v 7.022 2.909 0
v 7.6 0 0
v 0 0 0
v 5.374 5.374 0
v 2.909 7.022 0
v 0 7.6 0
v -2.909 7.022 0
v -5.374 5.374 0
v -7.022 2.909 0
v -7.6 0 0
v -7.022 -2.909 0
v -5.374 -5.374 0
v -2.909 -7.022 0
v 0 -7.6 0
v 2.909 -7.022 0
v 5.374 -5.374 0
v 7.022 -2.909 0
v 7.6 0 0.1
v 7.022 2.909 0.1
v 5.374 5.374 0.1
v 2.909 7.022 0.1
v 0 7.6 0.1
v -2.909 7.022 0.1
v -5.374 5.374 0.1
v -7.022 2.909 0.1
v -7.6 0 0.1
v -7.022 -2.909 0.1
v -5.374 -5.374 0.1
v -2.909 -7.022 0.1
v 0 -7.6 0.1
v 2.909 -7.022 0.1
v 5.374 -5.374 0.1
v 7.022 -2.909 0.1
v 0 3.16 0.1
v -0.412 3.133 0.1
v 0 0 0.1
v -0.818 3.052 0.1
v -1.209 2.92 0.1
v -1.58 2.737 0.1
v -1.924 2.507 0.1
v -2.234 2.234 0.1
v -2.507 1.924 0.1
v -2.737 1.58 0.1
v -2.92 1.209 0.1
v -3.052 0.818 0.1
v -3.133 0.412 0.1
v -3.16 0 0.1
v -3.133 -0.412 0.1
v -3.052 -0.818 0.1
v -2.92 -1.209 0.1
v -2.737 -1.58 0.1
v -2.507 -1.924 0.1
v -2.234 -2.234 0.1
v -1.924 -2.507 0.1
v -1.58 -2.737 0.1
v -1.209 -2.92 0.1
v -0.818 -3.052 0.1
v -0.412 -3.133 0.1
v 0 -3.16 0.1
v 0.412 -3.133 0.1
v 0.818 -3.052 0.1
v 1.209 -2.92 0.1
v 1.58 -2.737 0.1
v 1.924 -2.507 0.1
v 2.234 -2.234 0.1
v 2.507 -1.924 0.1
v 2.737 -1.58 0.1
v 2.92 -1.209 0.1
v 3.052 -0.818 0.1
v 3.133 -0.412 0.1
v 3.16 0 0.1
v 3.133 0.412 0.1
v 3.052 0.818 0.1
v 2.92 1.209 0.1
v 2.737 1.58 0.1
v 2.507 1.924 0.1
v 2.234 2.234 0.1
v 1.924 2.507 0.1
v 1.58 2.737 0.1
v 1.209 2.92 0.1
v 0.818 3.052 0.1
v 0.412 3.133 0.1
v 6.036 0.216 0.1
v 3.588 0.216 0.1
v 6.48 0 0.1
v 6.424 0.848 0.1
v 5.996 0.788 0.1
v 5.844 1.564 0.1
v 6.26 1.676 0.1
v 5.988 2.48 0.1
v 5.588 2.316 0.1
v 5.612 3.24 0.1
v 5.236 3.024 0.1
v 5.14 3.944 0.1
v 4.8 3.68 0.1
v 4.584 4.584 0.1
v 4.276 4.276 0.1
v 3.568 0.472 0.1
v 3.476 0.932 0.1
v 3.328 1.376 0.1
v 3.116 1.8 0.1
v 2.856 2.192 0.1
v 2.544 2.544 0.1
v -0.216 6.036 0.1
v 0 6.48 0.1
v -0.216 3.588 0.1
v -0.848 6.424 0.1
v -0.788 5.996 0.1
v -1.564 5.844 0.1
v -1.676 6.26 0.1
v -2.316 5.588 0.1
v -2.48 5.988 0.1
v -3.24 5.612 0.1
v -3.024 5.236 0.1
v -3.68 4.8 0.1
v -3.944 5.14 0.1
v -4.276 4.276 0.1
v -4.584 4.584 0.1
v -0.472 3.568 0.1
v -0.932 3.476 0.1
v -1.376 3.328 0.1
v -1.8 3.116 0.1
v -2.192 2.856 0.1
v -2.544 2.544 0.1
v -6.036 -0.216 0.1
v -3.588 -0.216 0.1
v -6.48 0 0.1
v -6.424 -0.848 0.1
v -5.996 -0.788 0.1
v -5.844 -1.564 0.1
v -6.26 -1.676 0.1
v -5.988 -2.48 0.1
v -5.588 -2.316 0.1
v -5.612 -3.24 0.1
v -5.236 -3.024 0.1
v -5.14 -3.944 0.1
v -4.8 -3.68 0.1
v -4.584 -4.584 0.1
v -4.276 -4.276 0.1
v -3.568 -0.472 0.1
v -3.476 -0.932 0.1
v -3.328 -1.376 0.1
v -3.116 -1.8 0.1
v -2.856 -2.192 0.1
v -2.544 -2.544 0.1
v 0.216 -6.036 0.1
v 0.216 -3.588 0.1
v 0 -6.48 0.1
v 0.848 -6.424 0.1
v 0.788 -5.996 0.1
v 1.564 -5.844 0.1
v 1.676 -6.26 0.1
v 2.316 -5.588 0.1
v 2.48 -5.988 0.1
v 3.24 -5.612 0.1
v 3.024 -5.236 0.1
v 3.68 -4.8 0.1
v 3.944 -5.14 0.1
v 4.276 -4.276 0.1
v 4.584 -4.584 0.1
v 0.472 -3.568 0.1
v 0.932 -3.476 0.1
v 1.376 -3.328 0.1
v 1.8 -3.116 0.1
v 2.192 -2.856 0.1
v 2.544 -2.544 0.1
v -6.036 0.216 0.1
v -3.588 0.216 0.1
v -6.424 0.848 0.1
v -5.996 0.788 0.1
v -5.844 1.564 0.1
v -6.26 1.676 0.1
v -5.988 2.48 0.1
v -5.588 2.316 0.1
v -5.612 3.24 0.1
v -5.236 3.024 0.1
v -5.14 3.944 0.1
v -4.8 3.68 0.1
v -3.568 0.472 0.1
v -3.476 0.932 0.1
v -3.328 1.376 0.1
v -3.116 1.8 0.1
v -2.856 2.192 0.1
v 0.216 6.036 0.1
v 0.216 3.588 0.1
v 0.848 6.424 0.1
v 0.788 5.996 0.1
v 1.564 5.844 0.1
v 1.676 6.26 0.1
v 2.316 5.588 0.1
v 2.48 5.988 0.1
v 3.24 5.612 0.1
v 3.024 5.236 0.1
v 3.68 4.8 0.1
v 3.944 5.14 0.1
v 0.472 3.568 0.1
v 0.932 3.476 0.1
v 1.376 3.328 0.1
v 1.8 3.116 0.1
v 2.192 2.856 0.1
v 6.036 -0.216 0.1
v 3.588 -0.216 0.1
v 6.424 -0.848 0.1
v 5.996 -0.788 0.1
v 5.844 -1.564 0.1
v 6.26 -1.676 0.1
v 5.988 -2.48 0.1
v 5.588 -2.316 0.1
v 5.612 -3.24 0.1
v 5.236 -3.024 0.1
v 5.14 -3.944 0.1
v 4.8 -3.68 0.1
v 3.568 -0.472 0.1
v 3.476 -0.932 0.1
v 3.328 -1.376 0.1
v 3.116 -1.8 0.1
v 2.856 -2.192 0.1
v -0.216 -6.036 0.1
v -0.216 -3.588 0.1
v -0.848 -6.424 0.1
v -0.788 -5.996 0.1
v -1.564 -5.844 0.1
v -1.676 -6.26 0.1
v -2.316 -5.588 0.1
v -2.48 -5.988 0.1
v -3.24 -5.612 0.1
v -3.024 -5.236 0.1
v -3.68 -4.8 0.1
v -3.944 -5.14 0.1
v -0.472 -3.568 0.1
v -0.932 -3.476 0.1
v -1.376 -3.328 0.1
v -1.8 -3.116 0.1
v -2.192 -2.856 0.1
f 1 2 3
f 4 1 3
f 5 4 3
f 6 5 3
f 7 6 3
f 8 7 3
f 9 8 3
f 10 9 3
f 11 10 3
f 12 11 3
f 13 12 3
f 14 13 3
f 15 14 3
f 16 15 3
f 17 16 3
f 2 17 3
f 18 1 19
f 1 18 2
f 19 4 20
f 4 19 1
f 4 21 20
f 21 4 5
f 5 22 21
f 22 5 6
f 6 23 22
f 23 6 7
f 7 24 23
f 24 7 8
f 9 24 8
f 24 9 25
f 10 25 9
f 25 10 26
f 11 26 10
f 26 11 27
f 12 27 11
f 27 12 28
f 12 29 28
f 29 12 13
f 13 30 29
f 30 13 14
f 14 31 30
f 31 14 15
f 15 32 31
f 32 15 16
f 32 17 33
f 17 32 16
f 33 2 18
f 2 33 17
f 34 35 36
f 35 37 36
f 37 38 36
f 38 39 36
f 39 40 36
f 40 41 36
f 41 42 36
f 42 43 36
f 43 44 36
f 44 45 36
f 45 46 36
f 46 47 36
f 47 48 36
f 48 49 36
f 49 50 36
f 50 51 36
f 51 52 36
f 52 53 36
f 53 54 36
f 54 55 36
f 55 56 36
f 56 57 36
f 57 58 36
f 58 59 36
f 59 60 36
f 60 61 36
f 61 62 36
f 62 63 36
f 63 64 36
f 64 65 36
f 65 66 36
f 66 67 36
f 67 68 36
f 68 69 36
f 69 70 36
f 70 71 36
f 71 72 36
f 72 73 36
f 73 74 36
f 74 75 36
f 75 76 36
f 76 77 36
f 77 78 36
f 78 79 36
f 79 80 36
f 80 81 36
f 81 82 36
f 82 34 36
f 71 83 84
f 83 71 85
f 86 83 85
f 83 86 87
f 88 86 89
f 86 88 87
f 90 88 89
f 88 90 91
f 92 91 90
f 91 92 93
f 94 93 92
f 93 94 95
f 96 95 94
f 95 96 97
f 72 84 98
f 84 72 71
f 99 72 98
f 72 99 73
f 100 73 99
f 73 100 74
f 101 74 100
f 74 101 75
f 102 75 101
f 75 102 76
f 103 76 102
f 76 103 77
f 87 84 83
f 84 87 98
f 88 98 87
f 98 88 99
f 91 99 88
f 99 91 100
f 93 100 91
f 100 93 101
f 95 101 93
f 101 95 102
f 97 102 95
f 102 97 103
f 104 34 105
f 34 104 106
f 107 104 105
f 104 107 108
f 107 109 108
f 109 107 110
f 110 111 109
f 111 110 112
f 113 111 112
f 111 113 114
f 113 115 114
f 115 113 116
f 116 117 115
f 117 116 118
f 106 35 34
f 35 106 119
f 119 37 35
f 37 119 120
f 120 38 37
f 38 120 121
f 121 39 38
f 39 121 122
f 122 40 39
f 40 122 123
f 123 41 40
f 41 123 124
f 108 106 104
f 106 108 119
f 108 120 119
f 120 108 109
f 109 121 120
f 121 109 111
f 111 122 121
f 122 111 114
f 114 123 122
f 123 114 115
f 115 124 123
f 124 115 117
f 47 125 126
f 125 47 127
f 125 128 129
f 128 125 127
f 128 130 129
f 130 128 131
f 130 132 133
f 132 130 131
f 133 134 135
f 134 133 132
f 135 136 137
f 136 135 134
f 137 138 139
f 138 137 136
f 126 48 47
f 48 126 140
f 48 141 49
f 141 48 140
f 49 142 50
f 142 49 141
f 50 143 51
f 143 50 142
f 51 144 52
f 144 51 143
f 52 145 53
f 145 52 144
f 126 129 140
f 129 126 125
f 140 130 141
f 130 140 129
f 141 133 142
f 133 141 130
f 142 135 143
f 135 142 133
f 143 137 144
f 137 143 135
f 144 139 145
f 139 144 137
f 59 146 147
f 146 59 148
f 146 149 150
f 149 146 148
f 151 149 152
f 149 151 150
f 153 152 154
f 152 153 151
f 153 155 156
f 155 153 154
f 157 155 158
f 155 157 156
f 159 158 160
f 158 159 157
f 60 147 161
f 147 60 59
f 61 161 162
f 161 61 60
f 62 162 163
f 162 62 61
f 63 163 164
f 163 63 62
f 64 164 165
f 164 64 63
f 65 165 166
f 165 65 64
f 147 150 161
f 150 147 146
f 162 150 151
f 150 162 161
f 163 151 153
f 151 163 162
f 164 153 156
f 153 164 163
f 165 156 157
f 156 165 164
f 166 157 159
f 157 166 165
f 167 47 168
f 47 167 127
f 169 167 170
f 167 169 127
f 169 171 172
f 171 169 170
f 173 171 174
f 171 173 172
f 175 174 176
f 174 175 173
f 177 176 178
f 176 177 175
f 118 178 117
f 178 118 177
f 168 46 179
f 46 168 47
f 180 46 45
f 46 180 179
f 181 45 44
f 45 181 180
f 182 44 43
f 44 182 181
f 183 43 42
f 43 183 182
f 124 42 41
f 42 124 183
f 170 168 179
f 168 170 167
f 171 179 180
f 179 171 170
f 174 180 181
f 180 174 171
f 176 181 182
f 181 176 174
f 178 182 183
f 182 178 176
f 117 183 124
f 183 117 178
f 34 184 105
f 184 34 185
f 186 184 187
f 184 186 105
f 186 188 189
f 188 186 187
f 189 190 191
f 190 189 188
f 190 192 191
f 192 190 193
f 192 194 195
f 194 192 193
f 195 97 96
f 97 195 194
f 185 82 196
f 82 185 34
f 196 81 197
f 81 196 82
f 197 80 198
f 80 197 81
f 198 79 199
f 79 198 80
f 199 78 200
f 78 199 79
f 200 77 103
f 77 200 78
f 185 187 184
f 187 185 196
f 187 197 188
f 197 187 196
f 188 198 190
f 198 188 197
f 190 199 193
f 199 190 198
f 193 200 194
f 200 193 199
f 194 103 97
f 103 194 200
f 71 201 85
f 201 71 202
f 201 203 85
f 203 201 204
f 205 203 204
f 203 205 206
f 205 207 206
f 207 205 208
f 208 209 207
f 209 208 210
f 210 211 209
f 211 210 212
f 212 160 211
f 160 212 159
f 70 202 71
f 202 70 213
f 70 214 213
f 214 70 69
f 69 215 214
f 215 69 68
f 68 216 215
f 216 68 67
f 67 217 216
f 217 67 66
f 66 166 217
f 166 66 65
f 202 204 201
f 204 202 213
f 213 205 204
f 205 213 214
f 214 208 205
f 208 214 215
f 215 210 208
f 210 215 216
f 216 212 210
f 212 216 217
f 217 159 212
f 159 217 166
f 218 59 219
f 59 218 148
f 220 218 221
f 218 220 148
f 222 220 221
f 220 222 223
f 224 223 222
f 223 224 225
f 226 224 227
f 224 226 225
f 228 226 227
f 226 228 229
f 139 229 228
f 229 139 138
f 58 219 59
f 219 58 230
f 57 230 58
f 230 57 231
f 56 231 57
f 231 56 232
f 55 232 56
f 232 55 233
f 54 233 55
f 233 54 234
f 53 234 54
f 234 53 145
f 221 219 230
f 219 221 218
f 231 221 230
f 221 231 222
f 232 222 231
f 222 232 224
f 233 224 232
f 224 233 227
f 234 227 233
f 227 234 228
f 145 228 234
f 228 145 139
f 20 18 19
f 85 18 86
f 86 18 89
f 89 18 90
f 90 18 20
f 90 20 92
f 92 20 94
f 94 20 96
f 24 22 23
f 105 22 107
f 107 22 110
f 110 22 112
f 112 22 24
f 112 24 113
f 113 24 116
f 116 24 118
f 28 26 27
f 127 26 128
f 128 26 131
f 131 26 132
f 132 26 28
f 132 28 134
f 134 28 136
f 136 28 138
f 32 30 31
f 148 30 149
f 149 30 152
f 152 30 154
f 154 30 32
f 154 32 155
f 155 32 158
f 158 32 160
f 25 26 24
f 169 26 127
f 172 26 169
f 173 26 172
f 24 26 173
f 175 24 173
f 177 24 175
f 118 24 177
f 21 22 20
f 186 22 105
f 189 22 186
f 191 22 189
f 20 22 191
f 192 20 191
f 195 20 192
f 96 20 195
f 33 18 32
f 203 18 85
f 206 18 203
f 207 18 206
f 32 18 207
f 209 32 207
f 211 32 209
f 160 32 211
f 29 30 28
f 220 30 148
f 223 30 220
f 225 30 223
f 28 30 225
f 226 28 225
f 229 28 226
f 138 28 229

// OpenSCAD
// file: ../p/1-8chrd.scad
use <../lib.scad>
function ldraw_lib__1_8chrd() = [
// 0 Chord 0.125
// 0 Name: 1-8chrd.dat
// 0 Author: Orion Pobursky [OrionP]
// 0 !LDRAW_ORG Primitive UPDATE 2023-05
// 0 !LICENSE Licensed under CC BY 4.0 : see CAreadme.txt
// 
// 0 BFC CERTIFY CCW
  [0,"BFC","CERTIFY"],
  [0,"BFC","CCW"],
// 
// 0 !HISTORY 2004-04-22 [PTadmin] Official Update 2004-02
// 0 !HISTORY 2007-06-22 [PTadmin] Header formatted for Contributor Agreement
// 0 !HISTORY 2008-07-01 [PTadmin] Official Update 2008-01
// 0 !HISTORY 2023-10-27 [OrionP] Rebuilt with PrimGen2, original author westrate
// 0 !HISTORY 2023-10-31 [OrionP] Official Update 2023-05
// 
// 3 16 1 0 0 0.9239 0 0.3827 0.7071 0 0.7071
  [3,16,1,0,0,0.9239,0,0.3827,0.7071,0,0.7071],
];
module ldraw_lib__1_8chrd(step=0, col=false, unit=2/5, alt=false, line=0.2, solid=!$preview)
    makepoly(ldraw_lib__1_8chrd(), step=step, col=col, unit=unit, alt=alt, line=line, solid=solid);
ldraw_lib__1_8chrd(line=0.2);
// file: ../p/4-4disc.scad
use <../lib.scad>
function ldraw_lib__4_4disc() = [
// 0 Disc 1.0
// 0 Name: 4-4disc.dat
// 0 Author: James Jessiman
// 0 !LDRAW_ORG Primitive UPDATE 2002-02
// 0 !LICENSE Licensed under CC BY 4.0 : see CAreadme.txt
// 
// 0 BFC CERTIFY CCW
  [0,"BFC","CERTIFY"],
  [0,"BFC","CCW"],
// 
// 0 !HISTORY 1998-12-15 [PTadmin] Official Update 1998-10
// 0 !HISTORY 2002-03-23 [sbliss] Added BFC statement
// 0 !HISTORY 2002-04-25 [PTadmin] Official Update 2002-02
// 0 !HISTORY 2007-06-24 [PTadmin] Header formatted for Contributor Agreement
// 0 !HISTORY 2008-07-01 [PTadmin] Official Update 2008-01
// 
// 
// 3 16 0 0 0 1 0 0 0.9239 0 0.3827
  [3,16,0,0,0,1,0,0,0.9239,0,0.3827],
// 3 16 0 0 0 0.9239 0 0.3827 0.7071 0 0.7071
  [3,16,0,0,0,0.9239,0,0.3827,0.7071,0,0.7071],
// 3 16 0 0 0 0.7071 0 0.7071 0.3827 0 0.9239
  [3,16,0,0,0,0.7071,0,0.7071,0.3827,0,0.9239],
// 3 16 0 0 0 0.3827 0 0.9239 0 0 1
  [3,16,0,0,0,0.3827,0,0.9239,0,0,1],
// 3 16 0 0 0 0 0 1 -0.3827 0 0.9239
  [3,16,0,0,0,0,0,1,-0.3827,0,0.9239],
// 3 16 0 0 0 -0.3827 0 0.9239 -0.7071 0 0.7071
  [3,16,0,0,0,-0.3827,0,0.9239,-0.7071,0,0.7071],
// 3 16 0 0 0 -0.7071 0 0.7071 -0.9239 0 0.3827
  [3,16,0,0,0,-0.7071,0,0.7071,-0.9239,0,0.3827],
// 3 16 0 0 0 -0.9239 0 0.3827 -1 0 -0
  [3,16,0,0,0,-0.9239,0,0.3827,-1,0,-0],
// 3 16 0 0 0 -1 0 -0 -0.9239 0 -0.3827
  [3,16,0,0,0,-1,0,-0,-0.9239,0,-0.3827],
// 3 16 0 0 0 -0.9239 0 -0.3827 -0.7071 0 -0.7071
  [3,16,0,0,0,-0.9239,0,-0.3827,-0.7071,0,-0.7071],
// 3 16 0 0 0 -0.7071 0 -0.7071 -0.3827 0 -0.9239
  [3,16,0,0,0,-0.7071,0,-0.7071,-0.3827,0,-0.9239],
// 3 16 0 0 0 -0.3827 0 -0.9239 0 0 -1
  [3,16,0,0,0,-0.3827,0,-0.9239,0,0,-1],
// 3 16 0 0 0 0 0 -1 0.3827 0 -0.9239
  [3,16,0,0,0,0,0,-1,0.3827,0,-0.9239],
// 3 16 0 0 0 0.3827 0 -0.9239 0.7071 0 -0.7071
  [3,16,0,0,0,0.3827,0,-0.9239,0.7071,0,-0.7071],
// 3 16 0 0 0 0.7071 0 -0.7071 0.9239 0 -0.3827
  [3,16,0,0,0,0.7071,0,-0.7071,0.9239,0,-0.3827],
// 3 16 0 0 0 0.9239 0 -0.3827 1 0 0
  [3,16,0,0,0,0.9239,0,-0.3827,1,0,0],
// 0
];
module ldraw_lib__4_4disc(step=0, col=false, unit=2/5, alt=false, line=0.2, solid=!$preview)
    makepoly(ldraw_lib__4_4disc(), step=step, col=col, unit=unit, alt=alt, line=line, solid=solid);
ldraw_lib__4_4disc(line=0.2);
// file: ../p/4-4cyli.scad
use <../lib.scad>
function ldraw_lib__4_4cyli() = [
// 0 Cylinder 1.0
// 0 Name: 4-4cyli.dat
// 0 Author: James Jessiman
// 0 !LDRAW_ORG Primitive UPDATE 2005-01
// 0 !LICENSE Licensed under CC BY 4.0 : see CAreadme.txt
// 
// 0 BFC CERTIFY CCW
  [0,"BFC","CERTIFY"],
  [0,"BFC","CCW"],
// 
// 0 !HISTORY 1998-12-15 [PTadmin] Official Update 1998-10
// 0 !HISTORY 2002-03-23 [sbliss] Added BFC statement; merged headers from files in distributions LDraw 0.27 and Complete.
// 0 !HISTORY 2002-04-25 [PTadmin] Official Update 2002-02
// 0 !HISTORY 2004-12-14 [guyvivan] BFC CCW
// 0 !HISTORY 2005-12-28 [PTadmin] Official Update 2005-01
// 0 !HISTORY 2007-06-24 [PTadmin] Header formatted for Contributor Agreement
// 0 !HISTORY 2008-07-01 [PTadmin] Official Update 2008-01
// 
// 
// 4 16 1 1 0 0.9239 1 0.3827 0.9239 0 0.3827 1 0 0
  [4,16,1,1,0,0.9239,1,0.3827,0.9239,0,0.3827,1,0,0],
// 5 24 1 0 0 1 1 0 0.9239 0 0.3827 0.9239 0 -0.3827
  [5,24,1,0,0,1,1,0,0.9239,0,0.3827,0.9239,0,-0.3827],
// 4 16 0.9239 1 0.3827 0.7071 1 0.7071 0.7071 0 0.7071 0.9239 0 0.3827
  [4,16,0.9239,1,0.3827,0.7071,1,0.7071,0.7071,0,0.7071,0.9239,0,0.3827],
// 5 24 0.9239 0 0.3827 0.9239 1 0.3827 0.7071 0 0.7071 1 0 0
  [5,24,0.9239,0,0.3827,0.9239,1,0.3827,0.7071,0,0.7071,1,0,0],
// 4 16 0.7071 1 0.7071 0.3827 1 0.9239 0.3827 0 0.9239 0.7071 0 0.7071
  [4,16,0.7071,1,0.7071,0.3827,1,0.9239,0.3827,0,0.9239,0.7071,0,0.7071],
// 5 24 0.7071 0 0.7071 0.7071 1 0.7071 0.3827 0 0.9239 0.9239 0 0.3827
  [5,24,0.7071,0,0.7071,0.7071,1,0.7071,0.3827,0,0.9239,0.9239,0,0.3827],
// 4 16 0.3827 1 0.9239 0 1 1 0 0 1 0.3827 0 0.9239
  [4,16,0.3827,1,0.9239,0,1,1,0,0,1,0.3827,0,0.9239],
// 5 24 0.3827 0 0.9239 0.3827 1 0.9239 0 0 1 0.7071 0 0.7071
  [5,24,0.3827,0,0.9239,0.3827,1,0.9239,0,0,1,0.7071,0,0.7071],
// 4 16 0 1 1 -0.3827 1 0.9239 -0.3827 0 0.9239 0 0 1
  [4,16,0,1,1,-0.3827,1,0.9239,-0.3827,0,0.9239,0,0,1],
// 5 24 0 0 1 0 1 1 -0.3827 0 0.9239 0.3827 0 0.9239
  [5,24,0,0,1,0,1,1,-0.3827,0,0.9239,0.3827,0,0.9239],
// 4 16 -0.3827 1 0.9239 -0.7071 1 0.7071 -0.7071 0 0.7071 -0.3827 0 0.9239
  [4,16,-0.3827,1,0.9239,-0.7071,1,0.7071,-0.7071,0,0.7071,-0.3827,0,0.9239],
// 5 24 -0.3827 0 0.9239 -0.3827 1 0.9239 -0.7071 0 0.7071 0 0 1
  [5,24,-0.3827,0,0.9239,-0.3827,1,0.9239,-0.7071,0,0.7071,0,0,1],
// 4 16 -0.7071 1 0.7071 -0.9239 1 0.3827 -0.9239 0 0.3827 -0.7071 0 0.7071
  [4,16,-0.7071,1,0.7071,-0.9239,1,0.3827,-0.9239,0,0.3827,-0.7071,0,0.7071],
// 5 24 -0.7071 0 0.7071 -0.7071 1 0.7071 -0.9239 0 0.3827 -0.3827 0 0.9239
  [5,24,-0.7071,0,0.7071,-0.7071,1,0.7071,-0.9239,0,0.3827,-0.3827,0,0.9239],
// 4 16 -0.9239 1 0.3827 -1 1 0 -1 0 0 -0.9239 0 0.3827
  [4,16,-0.9239,1,0.3827,-1,1,0,-1,0,0,-0.9239,0,0.3827],
// 5 24 -0.9239 0 0.3827 -0.9239 1 0.3827 -1 0 0 -0.7071 0 0.7071
  [5,24,-0.9239,0,0.3827,-0.9239,1,0.3827,-1,0,0,-0.7071,0,0.7071],
// 4 16 -1 1 0 -0.9239 1 -0.3827 -0.9239 0 -0.3827 -1 0 0
  [4,16,-1,1,0,-0.9239,1,-0.3827,-0.9239,0,-0.3827,-1,0,0],
// 5 24 -1 0 0 -1 1 0 -0.9239 0 -0.3827 -0.9239 0 0.3827
  [5,24,-1,0,0,-1,1,0,-0.9239,0,-0.3827,-0.9239,0,0.3827],
// 4 16 -0.9239 1 -0.3827 -0.7071 1 -0.7071 -0.7071 0 -0.7071 -0.9239 0 -0.3827
  [4,16,-0.9239,1,-0.3827,-0.7071,1,-0.7071,-0.7071,0,-0.7071,-0.9239,0,-0.3827],
// 5 24 -0.9239 0 -0.3827 -0.9239 1 -0.3827 -0.7071 0 -0.7071 -1 0 0
  [5,24,-0.9239,0,-0.3827,-0.9239,1,-0.3827,-0.7071,0,-0.7071,-1,0,0],
// 4 16 -0.7071 1 -0.7071 -0.3827 1 -0.9239 -0.3827 0 -0.9239 -0.7071 0 -0.7071
  [4,16,-0.7071,1,-0.7071,-0.3827,1,-0.9239,-0.3827,0,-0.9239,-0.7071,0,-0.7071],
// 5 24 -0.7071 0 -0.7071 -0.7071 1 -0.7071 -0.3827 0 -0.9239 -0.9239 0 -0.3827
  [5,24,-0.7071,0,-0.7071,-0.7071,1,-0.7071,-0.3827,0,-0.9239,-0.9239,0,-0.3827],
// 4 16 -0.3827 1 -0.9239 0 1 -1 0 0 -1 -0.3827 0 -0.9239
  [4,16,-0.3827,1,-0.9239,0,1,-1,0,0,-1,-0.3827,0,-0.9239],
// 5 24 -0.3827 0 -0.9239 -0.3827 1 -0.9239 0 0 -1 -0.7071 0 -0.7071
  [5,24,-0.3827,0,-0.9239,-0.3827,1,-0.9239,0,0,-1,-0.7071,0,-0.7071],
// 4 16 0 1 -1 0.3827 1 -0.9239 0.3827 0 -0.9239 0 0 -1
  [4,16,0,1,-1,0.3827,1,-0.9239,0.3827,0,-0.9239,0,0,-1],
// 5 24 0 0 -1 0 1 -1 0.3827 0 -0.9239 -0.3827 0 -0.9239
  [5,24,0,0,-1,0,1,-1,0.3827,0,-0.9239,-0.3827,0,-0.9239],
// 4 16 0.3827 1 -0.9239 0.7071 1 -0.7071 0.7071 0 -0.7071 0.3827 0 -0.9239
  [4,16,0.3827,1,-0.9239,0.7071,1,-0.7071,0.7071,0,-0.7071,0.3827,0,-0.9239],
// 5 24 0.3827 0 -0.9239 0.3827 1 -0.9239 0.7071 0 -0.7071 0 0 -1
  [5,24,0.3827,0,-0.9239,0.3827,1,-0.9239,0.7071,0,-0.7071,0,0,-1],
// 4 16 0.7071 1 -0.7071 0.9239 1 -0.3827 0.9239 0 -0.3827 0.7071 0 -0.7071
  [4,16,0.7071,1,-0.7071,0.9239,1,-0.3827,0.9239,0,-0.3827,0.7071,0,-0.7071],
// 5 24 0.7071 0 -0.7071 0.7071 1 -0.7071 0.9239 0 -0.3827 0.3827 0 -0.9239
  [5,24,0.7071,0,-0.7071,0.7071,1,-0.7071,0.9239,0,-0.3827,0.3827,0,-0.9239],
// 4 16 0.9239 1 -0.3827 1 1 0 1 0 0 0.9239 0 -0.3827
  [4,16,0.9239,1,-0.3827,1,1,0,1,0,0,0.9239,0,-0.3827],
// 5 24 0.9239 0 -0.3827 0.9239 1 -0.3827 1 0 0 0.7071 0 -0.7071
  [5,24,0.9239,0,-0.3827,0.9239,1,-0.3827,1,0,0,0.7071,0,-0.7071],
// 0
];
module ldraw_lib__4_4cyli(step=0, col=false, unit=2/5, alt=false, line=0.2, solid=!$preview)
    makepoly(ldraw_lib__4_4cyli(), step=step, col=col, unit=unit, alt=alt, line=line, solid=solid);
ldraw_lib__4_4cyli(line=0.2);
// file: s/820671as02.scad
use <../../lib.scad>
use <../../p/1-8chrd.scad>
function ldraw_lib__s__820671as02() = [
// 0 ~Sticker  1.9 x  1.9 Round with Lifepreserver - Outer Ring Eighth
// 0 Name: s\820671as02.dat
// 0 Author: Takeshi Takahashi [RainbowDolphin]
// 0 !LDRAW_ORG Subpart UPDATE 2024-09
// 0 !LICENSE Licensed under CC BY 4.0 : see CAreadme.txt
// 
// 0 BFC CERTIFY CCW
  [0,"BFC","CERTIFY"],
  [0,"BFC","CCW"],
// 
// 0 !HISTORY 2024-10-27 [OrionP] Official Update 2024-09
// 
// 1 16 0 0 0 19 0 0 0 1 0 0 0 19 1-8chrd.dat
  [1,16,0,0,0,19,0,0,0,1,0,0,0,19, ldraw_lib__1_8chrd()],
// 3 16 16.2 0 0 19 0 0 16.06 0 2.12
  [3,16,16.2,0,0,19,0,0,16.06,0,2.12],
// 3 16 16.06 0 2.12 19 0 0 15.65 0 4.19
  [3,16,16.06,0,2.12,19,0,0,15.65,0,4.19],
// 3 16 15.65 0 4.19 19 0 0 14.97 0 6.2
  [3,16,15.65,0,4.19,19,0,0,14.97,0,6.2],
// 3 16 14.97 0 6.2 19 0 0 13.4349 0 13.4349
  [3,16,14.97,0,6.2,19,0,0,13.4349,0,13.4349],
// 3 16 14.97 0 6.2 13.4349 0 13.4349 14.03 0 8.1
  [3,16,14.97,0,6.2,13.4349,0,13.4349,14.03,0,8.1],
// 3 16 14.03 0 8.1 13.4349 0 13.4349 12.85 0 9.86
  [3,16,14.03,0,8.1,13.4349,0,13.4349,12.85,0,9.86],
// 3 16 12.85 0 9.86 13.4349 0 13.4349 11.46 0 11.46
  [3,16,12.85,0,9.86,13.4349,0,13.4349,11.46,0,11.46],
];
module ldraw_lib__s__820671as02(step=0, col=false, unit=2/5, alt=false, line=0.2, solid=!$preview)
    makepoly(ldraw_lib__s__820671as02(), step=step, col=col, unit=unit, alt=alt, line=line, solid=solid);
ldraw_lib__s__820671as02(line=0.2);
// file: s/820671as01.scad
use <../../lib.scad>
function ldraw_lib__s__820671as01() = [
// 0 ~Pattern White and Red Four-Segment Lifepreserver - Eighth
// 0 Name: s\820671as01.dat
// 0 Author: Takeshi Takahashi [RainbowDolphin]
// 0 !LDRAW_ORG Subpart UPDATE 2024-09
// 0 !LICENSE Licensed under CC BY 4.0 : see CAreadme.txt
// 
// 0 BFC CERTIFY CCW
  [0,"BFC","CERTIFY"],
  [0,"BFC","CCW"],
// 
// 0 !HISTORY 2024-05-01 [RainbowDolphin] Subfiled the pattern for common use
// 0 !HISTORY 2024-10-27 [OrionP] Official Update 2024-09
// 
// 4 0 7.9 0 0 16.2 0 0 15.09 0 .54 8.97 0 .54
  [4,0,7.9,0,0,16.2,0,0,15.09,0,.54,8.97,0,.54],
// 4 0 15.09 0 .54 16.2 0 0 16.06 0 2.12 14.99 0 1.97
  [4,0,15.09,0,.54,16.2,0,0,16.06,0,2.12,14.99,0,1.97],
// 4 0 14.61 0 3.91 14.99 0 1.97 16.06 0 2.12 15.65 0 4.19
  [4,0,14.61,0,3.91,14.99,0,1.97,16.06,0,2.12,15.65,0,4.19],
// 4 0 13.97 0 5.79 14.61 0 3.91 15.65 0 4.19 14.97 0 6.2
  [4,0,13.97,0,5.79,14.61,0,3.91,15.65,0,4.19,14.97,0,6.2],
// 4 0 13.09 0 7.56 13.97 0 5.79 14.97 0 6.2 14.03 0 8.1
  [4,0,13.09,0,7.56,13.97,0,5.79,14.97,0,6.2,14.03,0,8.1],
// 4 0 12 0 9.2 13.09 0 7.56 14.03 0 8.1 12.85 0 9.86
  [4,0,12,0,9.2,13.09,0,7.56,14.03,0,8.1,12.85,0,9.86],
// 4 0 10.69 0 10.69 12 0 9.2 12.85 0 9.86 11.46 0 11.46
  [4,0,10.69,0,10.69,12,0,9.2,12.85,0,9.86,11.46,0,11.46],
// 4 0 7.83206 0 1.03095 7.9 0 0 8.97 0 .54 8.92 0 1.18
  [4,0,7.83206,0,1.03095,7.9,0,0,8.97,0,.54,8.92,0,1.18],
// 4 0 7.63061 0 2.04452 7.83206 0 1.03095 8.92 0 1.18 8.69 0 2.33
  [4,0,7.63061,0,2.04452,7.83206,0,1.03095,8.92,0,1.18,8.69,0,2.33],
// 4 0 7.29881 0 3.02333 7.63061 0 2.04452 8.69 0 2.33 8.32 0 3.44
  [4,0,7.29881,0,3.02333,7.63061,0,2.04452,8.69,0,2.33,8.32,0,3.44],
// 4 0 6.8414 0 3.95 7.29881 0 3.02333 8.32 0 3.44 7.79 0 4.5
  [4,0,6.8414,0,3.95,7.29881,0,3.02333,8.32,0,3.44,7.79,0,4.5],
// 4 0 6.26786 0 4.80952 6.8414 0 3.95 7.79 0 4.5 7.14 0 5.48
  [4,0,6.26786,0,4.80952,6.8414,0,3.95,7.79,0,4.5,7.14,0,5.48],
// 4 0 5.58609 0 5.58609 6.26786 0 4.80952 7.14 0 5.48 6.36 0 6.36
  [4,0,5.58609,0,5.58609,6.26786,0,4.80952,7.14,0,5.48,6.36,0,6.36],
// 4 16 8.92 0 1.18 8.97 0 .54 15.09 0 .54 14.99 0 1.97
  [4,16,8.92,0,1.18,8.97,0,.54,15.09,0,.54,14.99,0,1.97],
// 4 16 8.69 0 2.33 8.92 0 1.18 14.99 0 1.97 14.61 0 3.91
  [4,16,8.69,0,2.33,8.92,0,1.18,14.99,0,1.97,14.61,0,3.91],
// 4 16 8.32 0 3.44 8.69 0 2.33 14.61 0 3.91 13.97 0 5.79
  [4,16,8.32,0,3.44,8.69,0,2.33,14.61,0,3.91,13.97,0,5.79],
// 4 16 7.79 0 4.5 8.32 0 3.44 13.97 0 5.79 13.09 0 7.56
  [4,16,7.79,0,4.5,8.32,0,3.44,13.97,0,5.79,13.09,0,7.56],
// 4 16 7.14 0 5.48 7.79 0 4.5 13.09 0 7.56 12 0 9.2
  [4,16,7.14,0,5.48,7.79,0,4.5,13.09,0,7.56,12,0,9.2],
// 4 16 6.36 0 6.36 7.14 0 5.48 12 0 9.2 10.69 0 10.69
  [4,16,6.36,0,6.36,7.14,0,5.48,12,0,9.2,10.69,0,10.69],
];
module ldraw_lib__s__820671as01(step=0, col=false, unit=2/5, alt=false, line=0.2, solid=!$preview)
    makepoly(ldraw_lib__s__820671as01(), step=step, col=col, unit=unit, alt=alt, line=line, solid=solid);
ldraw_lib__s__820671as01(line=0.2);
// file: ../p/48/4-4disc.scad
use <../../lib.scad>
function ldraw_lib__48__4_4disc() = [
// 0 Hi-Res Disc 1.0
// 0 Name: 48\4-4disc.dat
// 0 Author: Willy Tschager [Holly-Wood]
// 0 !LDRAW_ORG 48_Primitive UPDATE 2024-01
// 0 !LICENSE Licensed under CC BY 4.0 : see CAreadme.txt
// 
// 0 BFC CERTIFY CCW
  [0,"BFC","CERTIFY"],
  [0,"BFC","CCW"],
// 
// 0 !HISTORY 2004-11-06 [PTadmin] Official Update 2004-04
// 0 !HISTORY 2007-06-24 [PTadmin] Header formatted for Contributor Agreement
// 0 !HISTORY 2008-07-01 [PTadmin] Official Update 2008-01
// 0 !HISTORY 2012-02-27 [Philo] Changed to CCW
// 0 !HISTORY 2012-08-09 [PTadmin] Official Update 2012-02
// 0 !HISTORY 2024-01-08 [Holly-Wood] Complete regeneration, original by hmick
// 0 !HISTORY 2024-01-29 [OrionP] Official Update 2024-01
// 
// 3 16 0 0 0 1 0 0 0.9914 0 0.1305
  [3,16,0,0,0,1,0,0,0.9914,0,0.1305],
// 3 16 0 0 0 0.9914 0 0.1305 0.9659 0 0.2588
  [3,16,0,0,0,0.9914,0,0.1305,0.9659,0,0.2588],
// 3 16 0 0 0 0.9659 0 0.2588 0.9239 0 0.3827
  [3,16,0,0,0,0.9659,0,0.2588,0.9239,0,0.3827],
// 3 16 0 0 0 0.9239 0 0.3827 0.866 0 0.5
  [3,16,0,0,0,0.9239,0,0.3827,0.866,0,0.5],
// 3 16 0 0 0 0.866 0 0.5 0.7934 0 0.6088
  [3,16,0,0,0,0.866,0,0.5,0.7934,0,0.6088],
// 3 16 0 0 0 0.7934 0 0.6088 0.7071 0 0.7071
  [3,16,0,0,0,0.7934,0,0.6088,0.7071,0,0.7071],
// 3 16 0 0 0 0.7071 0 0.7071 0.6088 0 0.7934
  [3,16,0,0,0,0.7071,0,0.7071,0.6088,0,0.7934],
// 3 16 0 0 0 0.6088 0 0.7934 0.5 0 0.866
  [3,16,0,0,0,0.6088,0,0.7934,0.5,0,0.866],
// 3 16 0 0 0 0.5 0 0.866 0.3827 0 0.9239
  [3,16,0,0,0,0.5,0,0.866,0.3827,0,0.9239],
// 3 16 0 0 0 0.3827 0 0.9239 0.2588 0 0.9659
  [3,16,0,0,0,0.3827,0,0.9239,0.2588,0,0.9659],
// 3 16 0 0 0 0.2588 0 0.9659 0.1305 0 0.9914
  [3,16,0,0,0,0.2588,0,0.9659,0.1305,0,0.9914],
// 3 16 0 0 0 0.1305 0 0.9914 0 0 1
  [3,16,0,0,0,0.1305,0,0.9914,0,0,1],
// 3 16 0 0 0 0 0 1 -0.1305 0 0.9914
  [3,16,0,0,0,0,0,1,-0.1305,0,0.9914],
// 3 16 0 0 0 -0.1305 0 0.9914 -0.2588 0 0.9659
  [3,16,0,0,0,-0.1305,0,0.9914,-0.2588,0,0.9659],
// 3 16 0 0 0 -0.2588 0 0.9659 -0.3827 0 0.9239
  [3,16,0,0,0,-0.2588,0,0.9659,-0.3827,0,0.9239],
// 3 16 0 0 0 -0.3827 0 0.9239 -0.5 0 0.866
  [3,16,0,0,0,-0.3827,0,0.9239,-0.5,0,0.866],
// 3 16 0 0 0 -0.5 0 0.866 -0.6088 0 0.7934
  [3,16,0,0,0,-0.5,0,0.866,-0.6088,0,0.7934],
// 3 16 0 0 0 -0.6088 0 0.7934 -0.7071 0 0.7071
  [3,16,0,0,0,-0.6088,0,0.7934,-0.7071,0,0.7071],
// 3 16 0 0 0 -0.7071 0 0.7071 -0.7934 0 0.6088
  [3,16,0,0,0,-0.7071,0,0.7071,-0.7934,0,0.6088],
// 3 16 0 0 0 -0.7934 0 0.6088 -0.866 0 0.5
  [3,16,0,0,0,-0.7934,0,0.6088,-0.866,0,0.5],
// 3 16 0 0 0 -0.866 0 0.5 -0.9239 0 0.3827
  [3,16,0,0,0,-0.866,0,0.5,-0.9239,0,0.3827],
// 3 16 0 0 0 -0.9239 0 0.3827 -0.9659 0 0.2588
  [3,16,0,0,0,-0.9239,0,0.3827,-0.9659,0,0.2588],
// 3 16 0 0 0 -0.9659 0 0.2588 -0.9914 0 0.1305
  [3,16,0,0,0,-0.9659,0,0.2588,-0.9914,0,0.1305],
// 3 16 0 0 0 -0.9914 0 0.1305 -1 0 0
  [3,16,0,0,0,-0.9914,0,0.1305,-1,0,0],
// 3 16 0 0 0 -1 0 0 -0.9914 0 -0.1305
  [3,16,0,0,0,-1,0,0,-0.9914,0,-0.1305],
// 3 16 0 0 0 -0.9914 0 -0.1305 -0.9659 0 -0.2588
  [3,16,0,0,0,-0.9914,0,-0.1305,-0.9659,0,-0.2588],
// 3 16 0 0 0 -0.9659 0 -0.2588 -0.9239 0 -0.3827
  [3,16,0,0,0,-0.9659,0,-0.2588,-0.9239,0,-0.3827],
// 3 16 0 0 0 -0.9239 0 -0.3827 -0.866 0 -0.5
  [3,16,0,0,0,-0.9239,0,-0.3827,-0.866,0,-0.5],
// 3 16 0 0 0 -0.866 0 -0.5 -0.7934 0 -0.6088
  [3,16,0,0,0,-0.866,0,-0.5,-0.7934,0,-0.6088],
// 3 16 0 0 0 -0.7934 0 -0.6088 -0.7071 0 -0.7071
  [3,16,0,0,0,-0.7934,0,-0.6088,-0.7071,0,-0.7071],
// 3 16 0 0 0 -0.7071 0 -0.7071 -0.6088 0 -0.7934
  [3,16,0,0,0,-0.7071,0,-0.7071,-0.6088,0,-0.7934],
// 3 16 0 0 0 -0.6088 0 -0.7934 -0.5 0 -0.866
  [3,16,0,0,0,-0.6088,0,-0.7934,-0.5,0,-0.866],
// 3 16 0 0 0 -0.5 0 -0.866 -0.3827 0 -0.9239
  [3,16,0,0,0,-0.5,0,-0.866,-0.3827,0,-0.9239],
// 3 16 0 0 0 -0.3827 0 -0.9239 -0.2588 0 -0.9659
  [3,16,0,0,0,-0.3827,0,-0.9239,-0.2588,0,-0.9659],
// 3 16 0 0 0 -0.2588 0 -0.9659 -0.1305 0 -0.9914
  [3,16,0,0,0,-0.2588,0,-0.9659,-0.1305,0,-0.9914],
// 3 16 0 0 0 -0.1305 0 -0.9914 0 0 -1
  [3,16,0,0,0,-0.1305,0,-0.9914,0,0,-1],
// 3 16 0 0 0 0 0 -1 0.1305 0 -0.9914
  [3,16,0,0,0,0,0,-1,0.1305,0,-0.9914],
// 3 16 0 0 0 0.1305 0 -0.9914 0.2588 0 -0.9659
  [3,16,0,0,0,0.1305,0,-0.9914,0.2588,0,-0.9659],
// 3 16 0 0 0 0.2588 0 -0.9659 0.3827 0 -0.9239
  [3,16,0,0,0,0.2588,0,-0.9659,0.3827,0,-0.9239],
// 3 16 0 0 0 0.3827 0 -0.9239 0.5 0 -0.866
  [3,16,0,0,0,0.3827,0,-0.9239,0.5,0,-0.866],
// 3 16 0 0 0 0.5 0 -0.866 0.6088 0 -0.7934
  [3,16,0,0,0,0.5,0,-0.866,0.6088,0,-0.7934],
// 3 16 0 0 0 0.6088 0 -0.7934 0.7071 0 -0.7071
  [3,16,0,0,0,0.6088,0,-0.7934,0.7071,0,-0.7071],
// 3 16 0 0 0 0.7071 0 -0.7071 0.7934 0 -0.6088
  [3,16,0,0,0,0.7071,0,-0.7071,0.7934,0,-0.6088],
// 3 16 0 0 0 0.7934 0 -0.6088 0.866 0 -0.5
  [3,16,0,0,0,0.7934,0,-0.6088,0.866,0,-0.5],
// 3 16 0 0 0 0.866 0 -0.5 0.9239 0 -0.3827
  [3,16,0,0,0,0.866,0,-0.5,0.9239,0,-0.3827],
// 3 16 0 0 0 0.9239 0 -0.3827 0.9659 0 -0.2588
  [3,16,0,0,0,0.9239,0,-0.3827,0.9659,0,-0.2588],
// 3 16 0 0 0 0.9659 0 -0.2588 0.9914 0 -0.1305
  [3,16,0,0,0,0.9659,0,-0.2588,0.9914,0,-0.1305],
// 3 16 0 0 0 0.9914 0 -0.1305 1 0 0
  [3,16,0,0,0,0.9914,0,-0.1305,1,0,0],
// 0 // Build by LDPartEditor (PrimGen 2.X)
];
module ldraw_lib__48__4_4disc(step=0, col=false, unit=2/5, alt=false, line=0.2, solid=!$preview)
    makepoly(ldraw_lib__48__4_4disc(), step=step, col=col, unit=unit, alt=alt, line=line, solid=solid);
ldraw_lib__48__4_4disc(line=0.2);
// file: ../p/4-4cylc3.scad
use <../lib.scad>
use <4-4cyli.scad>
use <4-4disc.scad>
function ldraw_lib__4_4cylc3() = [
// 0 Cylinder Closed 1.0 without Top or Bottom Edge Lines
// 0 Name: 4-4cylc3.dat
// 0 Author: Chris Dee [cwdee]
// 0 !LDRAW_ORG Primitive UPDATE 2017-01
// 0 !LICENSE Licensed under CC BY 4.0 : see CAreadme.txt
// 
// 0 BFC CERTIFY CCW
  [0,"BFC","CERTIFY"],
  [0,"BFC","CCW"],
// 
// 0 !HISTORY 2017-12-30 [PTadmin] Official Update 2017-01
// 
// 
// 1 16 0 0 0 1 0 0 0 1 0 0 0 1 4-4disc.dat
  [1,16,0,0,0,1,0,0,0,1,0,0,0,1, ldraw_lib__4_4disc()],
// 1 16 0 0 0 1 0 0 0 1 0 0 0 1 4-4cyli.dat
  [1,16,0,0,0,1,0,0,0,1,0,0,0,1, ldraw_lib__4_4cyli()],
// 0
];
module ldraw_lib__4_4cylc3(step=0, col=false, unit=2/5, alt=false, line=0.2, solid=!$preview)
    makepoly(ldraw_lib__4_4cylc3(), step=step, col=col, unit=unit, alt=alt, line=line, solid=solid);
ldraw_lib__4_4cylc3(line=0.2);
// file: 820671a.scad
use <../lib.scad>
use <../p/4-4cylc3.scad>
use <../p/48/4-4disc.scad>
use <s/820671as01.scad>
use <s/820671as02.scad>
function ldraw_lib__820671a() = [
// 0 Sticker  1.9 x  1.9 Round with Lifepreserver
// 0 Name: 820671a.dat
// 0 Author: Takeshi Takahashi [RainbowDolphin]
// 0 !LDRAW_ORG Part UPDATE 2024-09
// 0 !LICENSE Licensed under CC BY 4.0 : see CAreadme.txt
// 
// 0 BFC CERTIFY CCW
  [0,"BFC","CERTIFY"],
  [0,"BFC","CCW"],
// 
// 0 !KEYWORDS harbour, Nautica, Pier police, Set 6540
// 
// 0 !HISTORY 2003-07-28 [Steffen] BFCed, re-worked pattern completely with primitives, changed part into sticker
// 0 !HISTORY 2004-04-22 [PTadmin] Official Update 2004-02
// 0 !HISTORY 2007-10-08 [PTadmin] Header formatted for Contributor Agreement
// 0 !HISTORY 2008-07-01 [PTadmin] Official Update 2008-01
// 0 !HISTORY 2016-07-01 [cwdee] Updated description
// 0 !HISTORY 2016-12-31 [PTadmin] Official Update 2016-01
// 0 !HISTORY 2021-08-12 [MagFors] Removed edge lines and overlapping
// 0 !HISTORY 2021-08-15 [MagFors] Added missing black border
// 0 !HISTORY 2021-08-15 [PTadmin] Renamed from s10
// 0 !HISTORY 2022-07-18 [PTadmin] Official Update 2022-04
// 0 !HISTORY 2024-05-01 [RainbowDolphin] Complete re-write, original by Thomas Burger [grapeape]
// 0 !HISTORY 2024-10-27 [OrionP] Official Update 2024-09
// 
// 1 16 0 0 0 19 0 0 0 -0.25 0 0 0 19 4-4cylc3.dat
  [1,16,0,0,0,19,0,0,0,-0.25,0,0,0,19, ldraw_lib__4_4cylc3()],
// 1 16 0 -.25 0 0 0 -7.9 0 1 0 7.9 0 0 48\4-4disc.dat
  [1,16,0,-.25,0,0,0,-7.9,0,1,0,7.9,0,0, ldraw_lib__48__4_4disc()],
// 
// 0 BFC NOCLIP
  [0,"BFC","NOCLIP"],
// 1 15 0 -.25 0 1 0 0 0 1 0 0 0 1 s\820671as01.dat
  [1,15,0,-.25,0,1,0,0,0,1,0,0,0,1, ldraw_lib__s__820671as01()],
// 1 4 0 -.25 0 0 0 -1 0 1 0 1 0 0 s\820671as01.dat
  [1,4,0,-.25,0,0,0,-1,0,1,0,1,0,0, ldraw_lib__s__820671as01()],
// 1 15 0 -.25 0 -1 0 0 0 1 0 0 0 -1 s\820671as01.dat
  [1,15,0,-.25,0,-1,0,0,0,1,0,0,0,-1, ldraw_lib__s__820671as01()],
// 1 4 0 -.25 0 0 0 1 0 1 0 -1 0 0 s\820671as01.dat
  [1,4,0,-.25,0,0,0,1,0,1,0,-1,0,0, ldraw_lib__s__820671as01()],
// 1 4 0 -.25 0 -1 0 0 0 1 0 0 0 1 s\820671as01.dat
  [1,4,0,-.25,0,-1,0,0,0,1,0,0,0,1, ldraw_lib__s__820671as01()],
// 1 15 0 -.25 0 0 0 1 0 1 0 1 0 0 s\820671as01.dat
  [1,15,0,-.25,0,0,0,1,0,1,0,1,0,0, ldraw_lib__s__820671as01()],
// 1 4 0 -.25 0 1 0 0 0 1 0 0 0 -1 s\820671as01.dat
  [1,4,0,-.25,0,1,0,0,0,1,0,0,0,-1, ldraw_lib__s__820671as01()],
// 1 15 0 -.25 0 0 0 -1 0 1 0 -1 0 0 s\820671as01.dat
  [1,15,0,-.25,0,0,0,-1,0,1,0,-1,0,0, ldraw_lib__s__820671as01()],
// 0 BFC CLIP
  [0,"BFC","CLIP"],
// 1 16 0 -.25 0 1 0 0 0 1 0 0 0 1 s\820671as02.dat
  [1,16,0,-.25,0,1,0,0,0,1,0,0,0,1, ldraw_lib__s__820671as02()],
// 1 16 0 -.25 0 0 0 -1 0 1 0 1 0 0 s\820671as02.dat
  [1,16,0,-.25,0,0,0,-1,0,1,0,1,0,0, ldraw_lib__s__820671as02()],
// 1 16 0 -.25 0 -1 0 0 0 1 0 0 0 -1 s\820671as02.dat
  [1,16,0,-.25,0,-1,0,0,0,1,0,0,0,-1, ldraw_lib__s__820671as02()],
// 1 16 0 -.25 0 0 0 1 0 1 0 -1 0 0 s\820671as02.dat
  [1,16,0,-.25,0,0,0,1,0,1,0,-1,0,0, ldraw_lib__s__820671as02()],
// 1 16 0 -.25 0 -1 0 0 0 1 0 0 0 1 s\820671as02.dat
  [1,16,0,-.25,0,-1,0,0,0,1,0,0,0,1, ldraw_lib__s__820671as02()],
// 1 16 0 -.25 0 0 0 1 0 1 0 1 0 0 s\820671as02.dat
  [1,16,0,-.25,0,0,0,1,0,1,0,1,0,0, ldraw_lib__s__820671as02()],
// 1 16 0 -.25 0 1 0 0 0 1 0 0 0 -1 s\820671as02.dat
  [1,16,0,-.25,0,1,0,0,0,1,0,0,0,-1, ldraw_lib__s__820671as02()],
// 1 16 0 -.25 0 0 0 -1 0 1 0 -1 0 0 s\820671as02.dat
  [1,16,0,-.25,0,0,0,-1,0,1,0,-1,0,0, ldraw_lib__s__820671as02()],
];
module ldraw_lib__820671a(step=0, col=false, unit=2/5, alt=false, line=0.2, solid=!$preview)
    makepoly(ldraw_lib__820671a(), step=step, col=col, unit=unit, alt=alt, line=line, solid=solid);
ldraw_lib__820671a(line=0.2);
// main file
use <../lib.scad>
use <820671a.scad>
function ldraw_lib__196825b() = [
// 0 =Sticker  1.9 x  1.9 Round with Lifepreserver
// 0 Name: 196825b.dat
// 0 Author: Takeshi Takahashi [RainbowDolphin]
// 0 !LDRAW_ORG Part Alias UPDATE 2024-09
// 0 !LICENSE Licensed under CC BY 4.0 : see CAreadme.txt
// 
// 0 BFC CERTIFY CCW
  [0,"BFC","CERTIFY"],
  [0,"BFC","CCW"],
// 
// 0 !KEYWORDS coastguard, Rescue helicopter, Set 6697
// 
// 0 !HISTORY 2024-10-27 [OrionP] Official Update 2024-09
// 
// 1 16 0 0 0 1 0 0 0 1 0 0 0 1 820671a.dat
  [1,16,0,0,0,1,0,0,0,1,0,0,0,1, ldraw_lib__820671a()],
];
module ldraw_lib__196825b(step=0, col=false, unit=2/5, alt=false, line=0.2, solid=!$preview)
    makepoly(ldraw_lib__196825b(), step=step, col=col, unit=unit, alt=alt, line=line, solid=solid);
ldraw_lib__196825b(line=0.2);
